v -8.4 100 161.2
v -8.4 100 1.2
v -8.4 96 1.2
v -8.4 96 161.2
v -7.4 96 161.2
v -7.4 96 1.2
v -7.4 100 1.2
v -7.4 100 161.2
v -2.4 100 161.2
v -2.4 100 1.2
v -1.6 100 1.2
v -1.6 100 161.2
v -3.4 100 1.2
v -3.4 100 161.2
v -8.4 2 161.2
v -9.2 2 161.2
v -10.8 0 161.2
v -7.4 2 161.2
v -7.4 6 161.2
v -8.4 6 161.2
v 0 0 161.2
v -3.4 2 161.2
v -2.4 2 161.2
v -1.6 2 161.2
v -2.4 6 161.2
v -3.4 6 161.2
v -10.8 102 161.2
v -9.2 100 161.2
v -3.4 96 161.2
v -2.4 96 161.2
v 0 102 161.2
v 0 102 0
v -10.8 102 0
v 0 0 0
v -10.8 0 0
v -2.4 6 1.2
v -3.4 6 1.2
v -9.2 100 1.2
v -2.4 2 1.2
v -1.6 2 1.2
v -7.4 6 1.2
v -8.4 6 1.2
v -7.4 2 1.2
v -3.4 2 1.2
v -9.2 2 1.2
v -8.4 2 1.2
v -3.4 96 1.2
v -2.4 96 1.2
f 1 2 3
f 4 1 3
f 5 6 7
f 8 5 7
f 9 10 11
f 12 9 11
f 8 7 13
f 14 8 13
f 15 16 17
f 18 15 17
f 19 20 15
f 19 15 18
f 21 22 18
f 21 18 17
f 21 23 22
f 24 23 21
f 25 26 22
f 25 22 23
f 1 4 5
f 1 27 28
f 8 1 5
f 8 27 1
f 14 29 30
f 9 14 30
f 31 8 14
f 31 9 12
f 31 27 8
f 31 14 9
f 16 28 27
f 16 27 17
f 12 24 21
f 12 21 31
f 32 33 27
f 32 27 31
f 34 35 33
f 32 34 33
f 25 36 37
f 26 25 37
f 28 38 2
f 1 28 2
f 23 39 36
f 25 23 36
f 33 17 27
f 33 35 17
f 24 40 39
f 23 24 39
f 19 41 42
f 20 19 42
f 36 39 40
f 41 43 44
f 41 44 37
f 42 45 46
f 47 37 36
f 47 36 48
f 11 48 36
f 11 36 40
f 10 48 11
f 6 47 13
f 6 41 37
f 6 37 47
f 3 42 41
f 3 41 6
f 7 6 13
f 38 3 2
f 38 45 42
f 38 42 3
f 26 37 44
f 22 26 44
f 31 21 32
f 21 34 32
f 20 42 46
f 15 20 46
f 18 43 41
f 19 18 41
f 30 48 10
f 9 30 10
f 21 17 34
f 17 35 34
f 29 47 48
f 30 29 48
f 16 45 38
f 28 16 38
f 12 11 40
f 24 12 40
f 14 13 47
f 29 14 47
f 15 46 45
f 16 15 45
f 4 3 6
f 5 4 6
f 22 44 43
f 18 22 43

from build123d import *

# Parameters (mm, degrees)
SKETCH1_W           = 102
SKETCH1_H           = 10.8
BOSS_EXTRUDE1_DEPTH = 1.2
SKETCH2_W           = 10.8
SKETCH2_H           = 102
BOSS_EXTRUDE2_DEPTH = 160


with BuildPart() as part:
    # Sketch1 → Boss-Extrude1 (new body)
    with BuildSketch(Plane(origin=(0, 0, 0), x_dir=(0, 1, 0), z_dir=(0, 0, 1))):
        with Locations((51, 5.4)):
            Rectangle(SKETCH1_W, SKETCH1_H)
    extrude(amount=BOSS_EXTRUDE1_DEPTH)

    # Sketch2 → Boss-Extrude2 (add)
    with BuildSketch(Plane.XY.offset(1.2)):
        with Locations((-5.4, 51)):
            Rectangle(SKETCH2_W, SKETCH2_H)
        Polygon((-9.2, 100), (-8.4, 100), (-8.4, 96), (-7.4, 96), (-7.4, 100), (-3.4, 100), (-3.4, 96), (-2.4, 96), (-2.4, 100), (-1.6, 100), (-1.6, 2), (-2.4, 2), (-2.4, 6), (-3.4, 6), (-3.4, 2), (-7.4, 2), (-7.4, 6), (-8.4, 6), (-8.4, 2), (-9.2, 2), align=None, mode=Mode.SUBTRACT)
    extrude(amount=BOSS_EXTRUDE2_DEPTH)


solid = part.part
